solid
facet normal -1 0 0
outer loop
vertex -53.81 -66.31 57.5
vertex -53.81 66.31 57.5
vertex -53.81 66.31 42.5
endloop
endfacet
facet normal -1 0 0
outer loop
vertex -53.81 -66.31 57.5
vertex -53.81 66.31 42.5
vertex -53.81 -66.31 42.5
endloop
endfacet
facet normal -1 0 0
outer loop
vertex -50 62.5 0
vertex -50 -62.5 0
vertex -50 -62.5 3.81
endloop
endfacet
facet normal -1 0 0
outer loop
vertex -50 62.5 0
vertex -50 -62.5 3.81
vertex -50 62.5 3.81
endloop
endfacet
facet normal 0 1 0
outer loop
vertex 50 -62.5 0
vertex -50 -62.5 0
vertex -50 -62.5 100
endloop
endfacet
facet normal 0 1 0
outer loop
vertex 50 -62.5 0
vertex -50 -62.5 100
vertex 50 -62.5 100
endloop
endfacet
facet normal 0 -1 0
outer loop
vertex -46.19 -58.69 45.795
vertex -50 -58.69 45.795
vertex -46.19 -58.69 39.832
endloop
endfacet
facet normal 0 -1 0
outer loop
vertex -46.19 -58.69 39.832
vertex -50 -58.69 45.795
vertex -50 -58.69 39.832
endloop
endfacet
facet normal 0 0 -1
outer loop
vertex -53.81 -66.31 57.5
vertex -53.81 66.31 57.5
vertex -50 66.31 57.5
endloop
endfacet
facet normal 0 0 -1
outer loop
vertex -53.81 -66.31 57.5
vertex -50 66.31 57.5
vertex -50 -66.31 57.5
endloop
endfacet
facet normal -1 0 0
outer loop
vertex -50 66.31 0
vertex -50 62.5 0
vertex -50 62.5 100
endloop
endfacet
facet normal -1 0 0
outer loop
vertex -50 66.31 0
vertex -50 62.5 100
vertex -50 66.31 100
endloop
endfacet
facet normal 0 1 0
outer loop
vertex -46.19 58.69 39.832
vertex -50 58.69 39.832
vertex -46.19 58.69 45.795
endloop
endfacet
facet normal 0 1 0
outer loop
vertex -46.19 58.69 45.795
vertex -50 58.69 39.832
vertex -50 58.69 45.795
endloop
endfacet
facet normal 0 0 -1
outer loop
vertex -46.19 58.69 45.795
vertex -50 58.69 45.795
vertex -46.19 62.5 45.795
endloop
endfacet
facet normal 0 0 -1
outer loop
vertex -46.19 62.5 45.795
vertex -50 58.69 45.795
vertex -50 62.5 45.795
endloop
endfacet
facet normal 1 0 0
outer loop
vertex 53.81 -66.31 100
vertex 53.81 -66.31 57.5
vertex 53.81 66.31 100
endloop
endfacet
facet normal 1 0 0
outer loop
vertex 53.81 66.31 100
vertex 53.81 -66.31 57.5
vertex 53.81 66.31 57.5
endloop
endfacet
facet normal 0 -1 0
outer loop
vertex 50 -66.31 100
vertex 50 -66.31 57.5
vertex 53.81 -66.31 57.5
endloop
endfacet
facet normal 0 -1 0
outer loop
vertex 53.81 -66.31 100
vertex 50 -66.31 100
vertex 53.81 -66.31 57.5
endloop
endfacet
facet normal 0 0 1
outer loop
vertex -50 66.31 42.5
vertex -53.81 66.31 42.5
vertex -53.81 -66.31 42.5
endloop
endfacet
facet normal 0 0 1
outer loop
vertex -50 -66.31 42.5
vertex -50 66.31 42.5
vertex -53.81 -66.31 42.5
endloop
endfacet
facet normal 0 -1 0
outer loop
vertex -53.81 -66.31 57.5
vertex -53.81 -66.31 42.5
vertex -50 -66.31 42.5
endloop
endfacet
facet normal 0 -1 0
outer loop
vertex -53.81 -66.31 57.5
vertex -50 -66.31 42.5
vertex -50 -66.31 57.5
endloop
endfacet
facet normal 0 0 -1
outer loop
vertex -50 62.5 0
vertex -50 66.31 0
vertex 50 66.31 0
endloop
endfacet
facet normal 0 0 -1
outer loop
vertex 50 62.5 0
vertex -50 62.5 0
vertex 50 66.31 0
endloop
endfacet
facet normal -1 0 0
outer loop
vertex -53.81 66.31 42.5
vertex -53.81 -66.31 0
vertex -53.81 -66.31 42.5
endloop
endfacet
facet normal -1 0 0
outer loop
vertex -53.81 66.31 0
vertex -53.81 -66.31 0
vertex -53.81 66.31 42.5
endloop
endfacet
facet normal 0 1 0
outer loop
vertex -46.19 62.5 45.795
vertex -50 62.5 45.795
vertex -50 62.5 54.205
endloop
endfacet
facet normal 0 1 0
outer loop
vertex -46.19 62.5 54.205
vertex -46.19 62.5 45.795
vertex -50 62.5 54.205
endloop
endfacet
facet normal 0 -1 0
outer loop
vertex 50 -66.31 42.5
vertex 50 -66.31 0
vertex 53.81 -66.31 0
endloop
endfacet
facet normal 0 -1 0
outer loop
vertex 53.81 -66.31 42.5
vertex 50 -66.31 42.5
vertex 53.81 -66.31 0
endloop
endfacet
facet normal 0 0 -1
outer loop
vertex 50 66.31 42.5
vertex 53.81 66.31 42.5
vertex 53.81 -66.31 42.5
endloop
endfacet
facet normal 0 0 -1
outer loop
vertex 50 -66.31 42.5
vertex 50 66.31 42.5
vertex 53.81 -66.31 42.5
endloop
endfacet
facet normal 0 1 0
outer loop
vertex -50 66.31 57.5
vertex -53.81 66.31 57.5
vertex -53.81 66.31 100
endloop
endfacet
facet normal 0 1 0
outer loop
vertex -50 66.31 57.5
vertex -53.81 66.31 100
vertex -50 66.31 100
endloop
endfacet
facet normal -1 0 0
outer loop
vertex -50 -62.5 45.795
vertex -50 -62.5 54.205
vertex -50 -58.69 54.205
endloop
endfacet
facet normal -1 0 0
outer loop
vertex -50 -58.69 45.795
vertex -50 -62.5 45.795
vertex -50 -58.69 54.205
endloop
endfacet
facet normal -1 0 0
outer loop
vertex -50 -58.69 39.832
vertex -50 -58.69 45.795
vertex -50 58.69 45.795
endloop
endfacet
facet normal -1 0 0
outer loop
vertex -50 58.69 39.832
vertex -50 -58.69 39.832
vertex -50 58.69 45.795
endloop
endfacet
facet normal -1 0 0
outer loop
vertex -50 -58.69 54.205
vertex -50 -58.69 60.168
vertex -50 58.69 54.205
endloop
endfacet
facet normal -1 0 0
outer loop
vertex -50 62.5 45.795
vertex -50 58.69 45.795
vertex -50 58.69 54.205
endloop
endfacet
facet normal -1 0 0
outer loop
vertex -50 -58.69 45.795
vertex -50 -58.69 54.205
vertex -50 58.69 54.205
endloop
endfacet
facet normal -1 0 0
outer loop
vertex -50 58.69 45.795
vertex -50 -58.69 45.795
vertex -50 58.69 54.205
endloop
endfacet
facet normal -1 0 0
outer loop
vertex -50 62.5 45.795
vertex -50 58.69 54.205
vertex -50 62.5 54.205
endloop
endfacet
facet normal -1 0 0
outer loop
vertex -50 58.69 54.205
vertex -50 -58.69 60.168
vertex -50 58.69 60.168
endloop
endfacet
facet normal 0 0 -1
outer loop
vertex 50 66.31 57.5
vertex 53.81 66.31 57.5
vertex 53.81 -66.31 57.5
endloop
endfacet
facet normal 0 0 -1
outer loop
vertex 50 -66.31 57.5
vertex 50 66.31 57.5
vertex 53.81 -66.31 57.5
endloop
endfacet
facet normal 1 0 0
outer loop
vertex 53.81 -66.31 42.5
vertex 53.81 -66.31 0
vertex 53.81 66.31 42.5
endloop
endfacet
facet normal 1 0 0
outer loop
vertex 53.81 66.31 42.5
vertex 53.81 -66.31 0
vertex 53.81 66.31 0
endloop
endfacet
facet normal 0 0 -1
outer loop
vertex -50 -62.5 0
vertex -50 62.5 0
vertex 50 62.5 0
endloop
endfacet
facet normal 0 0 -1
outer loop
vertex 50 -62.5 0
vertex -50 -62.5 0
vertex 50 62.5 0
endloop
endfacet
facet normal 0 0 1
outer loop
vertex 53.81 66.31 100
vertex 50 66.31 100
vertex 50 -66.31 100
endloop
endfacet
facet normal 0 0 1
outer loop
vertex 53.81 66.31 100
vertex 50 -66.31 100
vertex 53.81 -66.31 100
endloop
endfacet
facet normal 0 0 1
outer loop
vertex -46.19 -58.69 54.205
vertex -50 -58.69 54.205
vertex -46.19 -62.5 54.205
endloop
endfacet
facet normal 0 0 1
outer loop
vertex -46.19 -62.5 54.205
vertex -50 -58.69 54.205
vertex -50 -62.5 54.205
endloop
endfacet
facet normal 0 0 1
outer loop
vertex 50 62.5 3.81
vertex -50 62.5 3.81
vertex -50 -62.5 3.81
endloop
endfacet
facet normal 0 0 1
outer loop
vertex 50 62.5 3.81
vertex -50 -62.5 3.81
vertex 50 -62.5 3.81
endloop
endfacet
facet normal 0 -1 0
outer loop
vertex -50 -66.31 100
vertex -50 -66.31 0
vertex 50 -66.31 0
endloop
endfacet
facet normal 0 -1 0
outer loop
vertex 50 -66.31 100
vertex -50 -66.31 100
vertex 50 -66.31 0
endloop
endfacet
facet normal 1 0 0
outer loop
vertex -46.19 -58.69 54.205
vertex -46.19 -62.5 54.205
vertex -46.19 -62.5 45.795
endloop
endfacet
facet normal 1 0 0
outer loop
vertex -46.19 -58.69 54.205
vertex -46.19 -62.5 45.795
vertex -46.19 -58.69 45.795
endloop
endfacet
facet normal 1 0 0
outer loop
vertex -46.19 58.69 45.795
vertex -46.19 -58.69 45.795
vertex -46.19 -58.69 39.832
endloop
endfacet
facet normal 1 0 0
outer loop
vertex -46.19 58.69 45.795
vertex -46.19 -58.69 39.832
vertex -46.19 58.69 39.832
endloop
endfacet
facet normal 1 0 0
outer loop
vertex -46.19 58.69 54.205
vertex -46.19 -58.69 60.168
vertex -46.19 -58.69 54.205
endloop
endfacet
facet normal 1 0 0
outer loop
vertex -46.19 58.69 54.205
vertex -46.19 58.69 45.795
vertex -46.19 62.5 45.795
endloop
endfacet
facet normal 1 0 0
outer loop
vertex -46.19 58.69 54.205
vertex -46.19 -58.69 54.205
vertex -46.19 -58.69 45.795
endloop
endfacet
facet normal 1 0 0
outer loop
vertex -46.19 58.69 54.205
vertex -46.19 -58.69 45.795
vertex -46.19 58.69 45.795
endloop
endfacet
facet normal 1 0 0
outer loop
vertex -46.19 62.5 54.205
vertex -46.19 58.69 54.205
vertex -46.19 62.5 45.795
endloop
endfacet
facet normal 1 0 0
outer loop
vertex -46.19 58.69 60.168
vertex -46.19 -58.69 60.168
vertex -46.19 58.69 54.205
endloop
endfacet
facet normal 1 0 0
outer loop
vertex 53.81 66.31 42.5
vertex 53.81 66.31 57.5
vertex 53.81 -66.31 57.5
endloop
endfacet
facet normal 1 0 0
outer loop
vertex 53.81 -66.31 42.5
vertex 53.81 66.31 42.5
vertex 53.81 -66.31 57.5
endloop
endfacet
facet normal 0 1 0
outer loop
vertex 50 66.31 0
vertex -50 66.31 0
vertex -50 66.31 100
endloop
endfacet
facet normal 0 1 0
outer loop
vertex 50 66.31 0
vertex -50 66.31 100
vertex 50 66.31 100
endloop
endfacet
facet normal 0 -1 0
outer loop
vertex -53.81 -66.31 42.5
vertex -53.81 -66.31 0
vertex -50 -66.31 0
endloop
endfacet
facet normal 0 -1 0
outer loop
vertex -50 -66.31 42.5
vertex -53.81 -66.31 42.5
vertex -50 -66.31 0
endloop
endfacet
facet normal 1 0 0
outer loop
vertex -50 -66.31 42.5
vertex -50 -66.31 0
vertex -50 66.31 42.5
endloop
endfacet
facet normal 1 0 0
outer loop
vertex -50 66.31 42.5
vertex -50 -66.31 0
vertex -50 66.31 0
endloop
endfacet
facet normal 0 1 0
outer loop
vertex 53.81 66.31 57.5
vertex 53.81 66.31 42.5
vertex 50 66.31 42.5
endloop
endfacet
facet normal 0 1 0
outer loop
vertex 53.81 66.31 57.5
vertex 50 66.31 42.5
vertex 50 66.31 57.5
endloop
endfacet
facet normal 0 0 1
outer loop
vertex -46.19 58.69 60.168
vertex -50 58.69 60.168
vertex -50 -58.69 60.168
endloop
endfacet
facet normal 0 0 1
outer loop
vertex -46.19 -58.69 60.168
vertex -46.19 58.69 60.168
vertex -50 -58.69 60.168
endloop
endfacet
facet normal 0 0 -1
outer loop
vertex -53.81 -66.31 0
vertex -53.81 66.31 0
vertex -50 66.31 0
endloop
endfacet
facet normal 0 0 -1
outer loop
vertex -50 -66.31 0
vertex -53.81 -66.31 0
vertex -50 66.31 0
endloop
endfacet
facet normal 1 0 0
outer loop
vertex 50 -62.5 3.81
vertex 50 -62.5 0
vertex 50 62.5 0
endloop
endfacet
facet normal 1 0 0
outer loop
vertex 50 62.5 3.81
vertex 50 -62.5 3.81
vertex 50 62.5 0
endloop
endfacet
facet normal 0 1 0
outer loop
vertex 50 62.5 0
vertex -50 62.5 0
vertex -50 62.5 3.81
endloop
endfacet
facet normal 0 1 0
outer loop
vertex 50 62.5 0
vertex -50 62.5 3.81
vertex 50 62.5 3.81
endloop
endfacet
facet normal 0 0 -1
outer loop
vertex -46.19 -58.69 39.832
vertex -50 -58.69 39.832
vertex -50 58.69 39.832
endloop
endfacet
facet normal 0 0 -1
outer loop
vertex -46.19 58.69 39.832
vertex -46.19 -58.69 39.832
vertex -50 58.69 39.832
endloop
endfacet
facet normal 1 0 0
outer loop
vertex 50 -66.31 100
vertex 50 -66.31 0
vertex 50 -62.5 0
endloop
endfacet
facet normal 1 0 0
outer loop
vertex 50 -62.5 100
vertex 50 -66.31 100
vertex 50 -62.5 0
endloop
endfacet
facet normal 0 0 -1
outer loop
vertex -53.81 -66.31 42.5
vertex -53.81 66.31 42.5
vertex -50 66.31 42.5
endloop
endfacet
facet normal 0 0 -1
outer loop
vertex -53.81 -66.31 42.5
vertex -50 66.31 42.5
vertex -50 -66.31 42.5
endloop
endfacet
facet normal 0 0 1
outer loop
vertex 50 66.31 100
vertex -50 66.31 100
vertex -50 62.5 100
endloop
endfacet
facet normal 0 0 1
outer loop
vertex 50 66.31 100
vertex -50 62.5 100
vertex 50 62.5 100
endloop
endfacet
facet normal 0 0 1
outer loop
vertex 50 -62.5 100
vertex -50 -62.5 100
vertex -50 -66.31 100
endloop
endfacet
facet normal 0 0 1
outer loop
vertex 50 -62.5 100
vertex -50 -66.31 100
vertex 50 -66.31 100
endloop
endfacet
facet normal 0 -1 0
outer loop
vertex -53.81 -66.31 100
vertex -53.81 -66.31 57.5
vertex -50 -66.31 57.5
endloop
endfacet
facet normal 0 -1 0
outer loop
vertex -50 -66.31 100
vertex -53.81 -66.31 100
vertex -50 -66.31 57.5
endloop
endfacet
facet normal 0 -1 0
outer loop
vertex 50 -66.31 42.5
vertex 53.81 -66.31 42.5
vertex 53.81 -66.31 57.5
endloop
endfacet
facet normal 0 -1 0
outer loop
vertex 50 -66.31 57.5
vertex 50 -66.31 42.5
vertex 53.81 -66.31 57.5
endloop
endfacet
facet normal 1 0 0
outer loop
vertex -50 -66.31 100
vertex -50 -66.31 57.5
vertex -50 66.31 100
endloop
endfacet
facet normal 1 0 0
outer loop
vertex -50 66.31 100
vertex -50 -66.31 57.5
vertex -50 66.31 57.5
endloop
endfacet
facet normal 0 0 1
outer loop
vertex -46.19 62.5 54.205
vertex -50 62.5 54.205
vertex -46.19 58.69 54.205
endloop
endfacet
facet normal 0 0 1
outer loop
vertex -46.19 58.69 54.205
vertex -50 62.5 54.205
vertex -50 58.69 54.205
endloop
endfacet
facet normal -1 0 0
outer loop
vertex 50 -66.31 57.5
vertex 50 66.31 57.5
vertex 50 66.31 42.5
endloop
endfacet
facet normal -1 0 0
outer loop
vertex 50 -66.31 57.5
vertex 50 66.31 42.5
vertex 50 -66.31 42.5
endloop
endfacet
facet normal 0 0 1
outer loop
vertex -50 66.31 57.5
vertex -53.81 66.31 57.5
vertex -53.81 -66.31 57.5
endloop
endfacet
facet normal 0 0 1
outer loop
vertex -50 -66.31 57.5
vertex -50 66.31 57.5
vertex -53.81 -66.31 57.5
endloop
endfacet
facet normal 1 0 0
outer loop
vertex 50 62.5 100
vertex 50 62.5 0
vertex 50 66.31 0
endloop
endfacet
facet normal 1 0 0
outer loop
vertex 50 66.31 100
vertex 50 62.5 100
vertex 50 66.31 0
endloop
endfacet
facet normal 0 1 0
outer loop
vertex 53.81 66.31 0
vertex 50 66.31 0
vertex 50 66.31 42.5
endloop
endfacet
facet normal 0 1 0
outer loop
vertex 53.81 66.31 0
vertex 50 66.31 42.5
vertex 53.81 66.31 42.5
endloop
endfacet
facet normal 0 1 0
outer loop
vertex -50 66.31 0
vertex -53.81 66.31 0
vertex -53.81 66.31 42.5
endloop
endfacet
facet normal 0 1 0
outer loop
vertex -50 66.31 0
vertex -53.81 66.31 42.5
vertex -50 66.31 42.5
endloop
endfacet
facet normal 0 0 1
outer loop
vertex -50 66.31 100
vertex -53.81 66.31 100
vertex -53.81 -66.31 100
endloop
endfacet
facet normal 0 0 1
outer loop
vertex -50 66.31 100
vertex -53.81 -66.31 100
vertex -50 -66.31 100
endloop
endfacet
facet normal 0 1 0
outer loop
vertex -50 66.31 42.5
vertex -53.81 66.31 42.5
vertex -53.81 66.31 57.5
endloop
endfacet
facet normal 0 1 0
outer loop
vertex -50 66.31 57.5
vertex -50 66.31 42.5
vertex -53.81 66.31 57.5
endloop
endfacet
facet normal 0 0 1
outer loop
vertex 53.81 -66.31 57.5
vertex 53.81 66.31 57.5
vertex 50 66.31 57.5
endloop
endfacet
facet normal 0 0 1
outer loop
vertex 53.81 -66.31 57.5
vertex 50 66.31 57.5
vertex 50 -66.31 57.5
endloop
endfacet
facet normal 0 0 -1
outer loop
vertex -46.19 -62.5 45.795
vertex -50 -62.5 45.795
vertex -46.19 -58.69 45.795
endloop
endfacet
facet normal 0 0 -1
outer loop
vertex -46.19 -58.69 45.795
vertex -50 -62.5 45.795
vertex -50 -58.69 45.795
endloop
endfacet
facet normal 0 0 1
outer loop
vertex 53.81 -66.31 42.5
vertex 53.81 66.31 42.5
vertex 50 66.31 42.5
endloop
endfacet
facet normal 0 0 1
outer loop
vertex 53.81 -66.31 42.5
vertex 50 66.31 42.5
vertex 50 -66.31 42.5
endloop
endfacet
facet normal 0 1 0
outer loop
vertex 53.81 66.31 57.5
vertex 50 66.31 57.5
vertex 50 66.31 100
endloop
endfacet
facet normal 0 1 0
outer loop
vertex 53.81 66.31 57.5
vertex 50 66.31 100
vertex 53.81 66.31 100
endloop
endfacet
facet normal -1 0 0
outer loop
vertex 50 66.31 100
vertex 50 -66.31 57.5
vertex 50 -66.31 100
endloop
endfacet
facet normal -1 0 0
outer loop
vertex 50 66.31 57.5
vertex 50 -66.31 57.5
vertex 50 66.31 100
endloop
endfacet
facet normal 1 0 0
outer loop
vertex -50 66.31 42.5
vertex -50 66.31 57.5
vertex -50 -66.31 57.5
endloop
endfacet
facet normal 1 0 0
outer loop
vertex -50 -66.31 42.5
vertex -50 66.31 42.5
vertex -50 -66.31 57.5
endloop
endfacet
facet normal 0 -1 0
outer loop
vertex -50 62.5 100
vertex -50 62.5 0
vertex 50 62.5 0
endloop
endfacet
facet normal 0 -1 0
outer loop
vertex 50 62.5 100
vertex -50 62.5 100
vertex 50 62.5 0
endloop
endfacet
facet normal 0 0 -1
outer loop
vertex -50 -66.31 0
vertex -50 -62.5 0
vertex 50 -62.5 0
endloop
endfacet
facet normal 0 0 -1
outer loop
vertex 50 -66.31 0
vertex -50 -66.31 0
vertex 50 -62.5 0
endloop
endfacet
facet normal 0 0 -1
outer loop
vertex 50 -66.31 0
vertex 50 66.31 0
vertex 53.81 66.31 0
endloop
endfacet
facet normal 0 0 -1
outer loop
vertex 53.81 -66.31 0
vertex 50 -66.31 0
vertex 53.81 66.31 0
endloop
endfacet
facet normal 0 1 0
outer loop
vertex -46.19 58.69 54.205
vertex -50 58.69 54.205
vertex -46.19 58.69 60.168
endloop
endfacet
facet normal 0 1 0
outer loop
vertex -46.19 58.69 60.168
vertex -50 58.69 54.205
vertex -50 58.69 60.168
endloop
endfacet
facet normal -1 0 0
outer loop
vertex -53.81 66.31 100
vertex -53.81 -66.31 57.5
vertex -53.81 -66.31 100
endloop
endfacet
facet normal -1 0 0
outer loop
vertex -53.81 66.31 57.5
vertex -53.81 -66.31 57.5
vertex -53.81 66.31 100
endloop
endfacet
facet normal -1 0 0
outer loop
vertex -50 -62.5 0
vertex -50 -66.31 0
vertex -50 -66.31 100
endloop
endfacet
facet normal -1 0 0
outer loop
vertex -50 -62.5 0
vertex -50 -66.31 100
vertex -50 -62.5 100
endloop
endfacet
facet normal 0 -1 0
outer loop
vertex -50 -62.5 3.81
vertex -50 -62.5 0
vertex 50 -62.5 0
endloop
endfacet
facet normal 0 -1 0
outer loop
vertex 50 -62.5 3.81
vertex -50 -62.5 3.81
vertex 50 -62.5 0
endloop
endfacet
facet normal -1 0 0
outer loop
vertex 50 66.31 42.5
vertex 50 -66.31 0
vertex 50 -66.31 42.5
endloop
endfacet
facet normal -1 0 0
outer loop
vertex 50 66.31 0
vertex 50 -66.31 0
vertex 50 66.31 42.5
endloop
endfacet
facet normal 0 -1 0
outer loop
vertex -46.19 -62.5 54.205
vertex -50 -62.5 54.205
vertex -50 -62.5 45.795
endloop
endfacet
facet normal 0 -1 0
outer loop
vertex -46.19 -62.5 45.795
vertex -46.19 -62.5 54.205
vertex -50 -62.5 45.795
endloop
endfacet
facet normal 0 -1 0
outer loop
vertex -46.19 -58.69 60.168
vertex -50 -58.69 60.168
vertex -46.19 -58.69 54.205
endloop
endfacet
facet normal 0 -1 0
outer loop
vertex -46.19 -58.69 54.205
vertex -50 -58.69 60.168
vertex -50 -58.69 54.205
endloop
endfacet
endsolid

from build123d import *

# Parameters (mm, degrees)
F0_W      = 100
F0_H      = 125
F1_DEPTH  = 3.81
F2_W      = 100
F2_H      = 3.81
F3_DEPTH  = 100
F4_W      = 3.81
F4_H      = 132.62
F5_DEPTH  = 100
F6_W      = 132.62
F6_H      = 15
F7_DEPTH  = 3.81
F11_DEPTH = 3.81


with BuildPart() as f1:
    # F0 (on Top) → F1 (new body)
    with BuildSketch(Plane.XY):
        Rectangle(F0_W, F0_H)
    extrude(amount=F1_DEPTH)


with BuildPart() as f3:
    # F2 (on Top) → F3 (new body)
    with BuildSketch(Plane.XY):
        with Locations((0, 64.405)):
            Rectangle(F2_W, F2_H)
        with Locations((0, -64.405)):
            Rectangle(F2_W, F2_H)
    extrude(amount=F3_DEPTH)


with BuildPart() as f5:
    # F4 (on Top) → F5 (new body, through all)
    with BuildSketch(Plane.XY):
        with Locations((-51.905, 0)):
            Rectangle(F4_W, F4_H)
        with Locations((51.905, 0)):
            Rectangle(F4_W, F4_H)
    extrude(amount=F5_DEPTH)


with BuildPart() as f7:
    # F6 (on face) → F7 (new body, through all)
    with BuildSketch(Plane(origin=(-53.81, 0, 0), x_dir=(0, -1, 0), z_dir=(-1, 0, 0))):
        with Locations((0, 50)):
            Rectangle(F6_W, F6_H)
    extrude(amount=-F7_DEPTH)


with BuildPart() as f8_1:
    # F8: instance of F7
    add(f7.part.mirror(Plane.YZ))


with BuildPart() as f5_1:
    add(f5.part)

    # F9: cut F8_1, F7
    add(f8_1.part, mode=Mode.SUBTRACT)
    add(f7.part, mode=Mode.SUBTRACT)


with BuildPart() as f11:
    # F10 (on face) → F11 (new body)
    with BuildSketch(Plane.YZ.offset(-50)):
        Polygon((58.69, 54.204918), (58.69, 60.167585), (-58.69, 60.167585), (-58.69, 54.204918), (-62.5, 54.204918), (-62.5, 45.795082), (-58.69, 45.795082), (-58.69, 39.832415), (58.69, 39.832415), (58.69, 45.795082), (62.5, 45.795082), (62.5, 54.204918), align=None)
    extrude(amount=F11_DEPTH)


solid = Compound([f1.part, f3.part, f7.part, f8_1.part, f5_1.part, f11.part])
